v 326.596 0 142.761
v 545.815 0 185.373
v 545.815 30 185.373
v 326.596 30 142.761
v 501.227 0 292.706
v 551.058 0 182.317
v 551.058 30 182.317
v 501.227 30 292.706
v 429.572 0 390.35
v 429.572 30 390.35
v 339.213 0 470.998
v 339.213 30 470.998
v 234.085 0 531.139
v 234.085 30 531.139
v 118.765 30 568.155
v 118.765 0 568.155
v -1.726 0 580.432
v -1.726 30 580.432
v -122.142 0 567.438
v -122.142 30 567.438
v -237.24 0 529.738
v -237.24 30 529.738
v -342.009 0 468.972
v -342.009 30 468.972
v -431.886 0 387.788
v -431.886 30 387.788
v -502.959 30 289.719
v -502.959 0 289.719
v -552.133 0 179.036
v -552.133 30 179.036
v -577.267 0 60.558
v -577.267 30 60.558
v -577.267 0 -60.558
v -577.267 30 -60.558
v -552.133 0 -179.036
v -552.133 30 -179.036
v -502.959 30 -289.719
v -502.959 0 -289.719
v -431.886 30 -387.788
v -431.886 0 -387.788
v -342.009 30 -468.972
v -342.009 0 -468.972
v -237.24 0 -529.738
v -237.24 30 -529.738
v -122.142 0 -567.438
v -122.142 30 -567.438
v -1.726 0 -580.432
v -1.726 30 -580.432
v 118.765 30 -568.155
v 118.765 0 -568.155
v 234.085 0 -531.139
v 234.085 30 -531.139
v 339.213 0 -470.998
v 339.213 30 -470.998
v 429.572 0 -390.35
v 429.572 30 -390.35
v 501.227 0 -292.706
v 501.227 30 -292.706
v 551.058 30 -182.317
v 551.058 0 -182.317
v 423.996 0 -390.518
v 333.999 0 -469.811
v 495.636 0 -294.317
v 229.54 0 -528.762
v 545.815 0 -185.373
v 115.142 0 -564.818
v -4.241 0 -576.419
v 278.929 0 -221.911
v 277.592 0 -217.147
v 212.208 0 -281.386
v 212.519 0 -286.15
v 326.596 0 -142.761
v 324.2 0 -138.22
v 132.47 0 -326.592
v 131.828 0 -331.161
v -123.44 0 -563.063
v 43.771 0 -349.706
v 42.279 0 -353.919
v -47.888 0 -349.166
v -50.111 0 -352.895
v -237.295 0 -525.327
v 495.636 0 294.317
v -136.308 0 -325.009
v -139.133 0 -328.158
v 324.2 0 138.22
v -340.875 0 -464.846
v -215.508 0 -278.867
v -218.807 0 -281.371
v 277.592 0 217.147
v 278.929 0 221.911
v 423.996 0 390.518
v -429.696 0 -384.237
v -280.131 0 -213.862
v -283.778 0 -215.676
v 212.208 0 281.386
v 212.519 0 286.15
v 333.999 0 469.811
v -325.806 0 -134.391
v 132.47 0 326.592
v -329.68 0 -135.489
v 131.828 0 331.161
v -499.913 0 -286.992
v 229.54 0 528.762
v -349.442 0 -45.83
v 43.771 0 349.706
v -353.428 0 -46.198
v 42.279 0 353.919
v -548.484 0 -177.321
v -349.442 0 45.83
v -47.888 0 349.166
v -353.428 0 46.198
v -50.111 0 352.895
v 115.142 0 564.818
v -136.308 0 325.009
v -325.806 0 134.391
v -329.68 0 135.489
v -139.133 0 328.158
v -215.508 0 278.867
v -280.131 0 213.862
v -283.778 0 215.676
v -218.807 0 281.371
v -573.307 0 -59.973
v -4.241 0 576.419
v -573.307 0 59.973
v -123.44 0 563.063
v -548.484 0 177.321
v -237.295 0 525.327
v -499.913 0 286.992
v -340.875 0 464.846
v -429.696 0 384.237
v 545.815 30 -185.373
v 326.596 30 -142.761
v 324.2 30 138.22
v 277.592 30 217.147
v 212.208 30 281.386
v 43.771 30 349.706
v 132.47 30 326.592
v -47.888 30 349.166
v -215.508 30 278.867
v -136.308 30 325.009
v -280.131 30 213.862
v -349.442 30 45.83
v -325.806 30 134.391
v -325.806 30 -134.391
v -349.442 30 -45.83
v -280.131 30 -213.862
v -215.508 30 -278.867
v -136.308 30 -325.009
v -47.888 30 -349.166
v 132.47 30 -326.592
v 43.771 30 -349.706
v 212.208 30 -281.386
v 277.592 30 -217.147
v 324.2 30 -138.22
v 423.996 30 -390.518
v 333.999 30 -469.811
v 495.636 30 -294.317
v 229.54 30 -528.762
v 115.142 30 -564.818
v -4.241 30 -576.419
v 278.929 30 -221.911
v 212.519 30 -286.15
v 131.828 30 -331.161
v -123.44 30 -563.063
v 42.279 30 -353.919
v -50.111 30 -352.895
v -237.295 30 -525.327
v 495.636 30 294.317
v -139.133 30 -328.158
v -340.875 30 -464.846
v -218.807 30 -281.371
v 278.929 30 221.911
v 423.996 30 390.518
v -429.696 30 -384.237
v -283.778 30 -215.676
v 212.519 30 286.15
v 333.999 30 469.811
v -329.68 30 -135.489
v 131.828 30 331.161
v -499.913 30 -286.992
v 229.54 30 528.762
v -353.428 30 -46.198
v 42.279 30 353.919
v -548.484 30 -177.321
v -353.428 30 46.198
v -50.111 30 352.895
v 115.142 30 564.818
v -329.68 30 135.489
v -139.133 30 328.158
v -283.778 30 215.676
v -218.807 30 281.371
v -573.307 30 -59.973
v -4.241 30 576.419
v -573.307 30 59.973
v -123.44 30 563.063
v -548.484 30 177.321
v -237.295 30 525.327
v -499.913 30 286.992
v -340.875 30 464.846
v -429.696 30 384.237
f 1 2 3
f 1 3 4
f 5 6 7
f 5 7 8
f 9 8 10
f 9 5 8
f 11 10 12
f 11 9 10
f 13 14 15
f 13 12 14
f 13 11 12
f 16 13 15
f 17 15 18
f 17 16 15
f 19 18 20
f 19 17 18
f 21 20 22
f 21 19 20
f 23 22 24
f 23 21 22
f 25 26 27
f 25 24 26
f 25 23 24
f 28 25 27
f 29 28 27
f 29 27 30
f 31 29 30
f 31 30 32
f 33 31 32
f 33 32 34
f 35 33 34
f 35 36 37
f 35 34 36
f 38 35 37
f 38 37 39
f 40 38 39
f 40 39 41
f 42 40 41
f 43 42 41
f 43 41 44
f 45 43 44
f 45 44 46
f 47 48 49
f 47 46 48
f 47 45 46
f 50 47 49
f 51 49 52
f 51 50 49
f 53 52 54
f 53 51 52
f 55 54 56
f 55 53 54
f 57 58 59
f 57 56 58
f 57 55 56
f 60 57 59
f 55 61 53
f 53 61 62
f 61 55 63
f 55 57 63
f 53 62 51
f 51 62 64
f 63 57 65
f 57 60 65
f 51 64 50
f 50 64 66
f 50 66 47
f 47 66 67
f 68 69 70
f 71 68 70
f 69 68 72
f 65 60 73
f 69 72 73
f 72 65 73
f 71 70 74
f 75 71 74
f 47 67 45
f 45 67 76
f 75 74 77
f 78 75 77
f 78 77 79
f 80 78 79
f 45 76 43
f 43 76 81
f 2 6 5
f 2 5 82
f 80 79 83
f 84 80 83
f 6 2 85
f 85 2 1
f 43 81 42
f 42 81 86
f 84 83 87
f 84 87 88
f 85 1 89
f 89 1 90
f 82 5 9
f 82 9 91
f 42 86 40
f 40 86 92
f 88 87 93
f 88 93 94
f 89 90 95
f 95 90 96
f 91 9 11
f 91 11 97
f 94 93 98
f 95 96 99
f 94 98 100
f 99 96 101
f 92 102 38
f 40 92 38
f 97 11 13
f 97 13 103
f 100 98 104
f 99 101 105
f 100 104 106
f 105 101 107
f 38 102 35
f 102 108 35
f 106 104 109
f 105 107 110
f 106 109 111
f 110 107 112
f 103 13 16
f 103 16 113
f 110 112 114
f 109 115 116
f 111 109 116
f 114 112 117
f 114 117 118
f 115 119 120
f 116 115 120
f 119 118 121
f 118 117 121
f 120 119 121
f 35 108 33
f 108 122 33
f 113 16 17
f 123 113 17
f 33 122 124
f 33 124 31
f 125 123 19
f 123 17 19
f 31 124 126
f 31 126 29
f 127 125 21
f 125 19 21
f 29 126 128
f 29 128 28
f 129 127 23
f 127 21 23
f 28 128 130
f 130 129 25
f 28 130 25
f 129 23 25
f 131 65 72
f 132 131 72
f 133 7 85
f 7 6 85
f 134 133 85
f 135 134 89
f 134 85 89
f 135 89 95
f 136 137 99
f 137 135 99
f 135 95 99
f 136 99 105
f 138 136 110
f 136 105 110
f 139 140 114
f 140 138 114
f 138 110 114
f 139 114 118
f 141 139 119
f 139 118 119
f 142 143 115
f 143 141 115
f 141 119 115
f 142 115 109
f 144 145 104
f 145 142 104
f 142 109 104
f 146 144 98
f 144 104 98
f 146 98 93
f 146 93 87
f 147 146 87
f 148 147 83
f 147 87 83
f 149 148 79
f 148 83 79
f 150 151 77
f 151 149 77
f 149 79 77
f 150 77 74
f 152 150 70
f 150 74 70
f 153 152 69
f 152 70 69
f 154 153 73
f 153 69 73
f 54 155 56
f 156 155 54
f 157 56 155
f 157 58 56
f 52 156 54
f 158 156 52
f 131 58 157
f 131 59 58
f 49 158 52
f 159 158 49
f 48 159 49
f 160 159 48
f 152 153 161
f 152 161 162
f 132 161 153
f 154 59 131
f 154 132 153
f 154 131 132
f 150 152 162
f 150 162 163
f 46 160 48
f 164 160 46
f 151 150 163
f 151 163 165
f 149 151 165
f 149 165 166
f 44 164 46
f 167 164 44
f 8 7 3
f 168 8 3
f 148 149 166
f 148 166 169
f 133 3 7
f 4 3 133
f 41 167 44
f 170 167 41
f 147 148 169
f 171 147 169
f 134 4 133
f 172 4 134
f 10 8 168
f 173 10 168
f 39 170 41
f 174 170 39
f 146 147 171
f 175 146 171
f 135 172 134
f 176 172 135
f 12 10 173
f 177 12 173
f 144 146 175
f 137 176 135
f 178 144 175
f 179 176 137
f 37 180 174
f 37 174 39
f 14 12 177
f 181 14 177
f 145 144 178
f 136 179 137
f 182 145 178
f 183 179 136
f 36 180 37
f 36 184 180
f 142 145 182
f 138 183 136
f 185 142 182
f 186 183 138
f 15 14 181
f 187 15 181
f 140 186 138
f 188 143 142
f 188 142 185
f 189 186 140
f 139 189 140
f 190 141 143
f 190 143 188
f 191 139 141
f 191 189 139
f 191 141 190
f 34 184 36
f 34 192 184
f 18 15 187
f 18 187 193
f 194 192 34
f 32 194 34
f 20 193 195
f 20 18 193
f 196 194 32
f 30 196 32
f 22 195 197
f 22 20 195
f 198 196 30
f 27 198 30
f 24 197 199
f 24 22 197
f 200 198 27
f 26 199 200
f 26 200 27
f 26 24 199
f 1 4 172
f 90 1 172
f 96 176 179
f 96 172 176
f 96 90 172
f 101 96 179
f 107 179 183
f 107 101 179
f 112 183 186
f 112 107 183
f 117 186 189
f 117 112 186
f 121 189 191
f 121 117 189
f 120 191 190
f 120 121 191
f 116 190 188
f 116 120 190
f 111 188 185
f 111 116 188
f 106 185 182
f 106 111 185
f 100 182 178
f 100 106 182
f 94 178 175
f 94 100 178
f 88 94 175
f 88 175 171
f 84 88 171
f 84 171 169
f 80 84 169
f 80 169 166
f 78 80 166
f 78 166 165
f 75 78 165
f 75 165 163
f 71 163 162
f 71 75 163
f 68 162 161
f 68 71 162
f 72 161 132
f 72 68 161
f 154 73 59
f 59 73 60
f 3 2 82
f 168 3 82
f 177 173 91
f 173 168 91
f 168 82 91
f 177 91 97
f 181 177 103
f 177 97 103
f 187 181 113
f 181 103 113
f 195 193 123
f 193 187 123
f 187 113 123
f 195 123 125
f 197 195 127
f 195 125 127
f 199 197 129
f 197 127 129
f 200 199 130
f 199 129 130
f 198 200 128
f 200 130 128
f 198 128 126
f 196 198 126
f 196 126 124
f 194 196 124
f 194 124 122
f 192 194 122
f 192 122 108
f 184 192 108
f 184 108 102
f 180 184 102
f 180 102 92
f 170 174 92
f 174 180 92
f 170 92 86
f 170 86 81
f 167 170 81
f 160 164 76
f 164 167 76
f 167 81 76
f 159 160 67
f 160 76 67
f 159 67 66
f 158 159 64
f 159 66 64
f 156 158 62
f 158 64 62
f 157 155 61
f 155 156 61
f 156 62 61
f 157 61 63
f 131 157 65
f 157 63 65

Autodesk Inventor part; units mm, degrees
ref_plane "YZ Plane" through (0, 0, 0) normal (1, 0, 0) x (0, 1, 0)
ref_plane "XZ Plane" through (0, 0, 0) normal (0, 1, 0) x (-1, 0, 0)
ref_plane "XY Plane" through (0, 0, 0) normal (0, 0, 1) x (1, 0, 0)
sketch "Sketch1" plane through (0, 0, 0) normal (0, 1, 0) x (-1, 0, 0)
  line L0 (-545.8153, 185.3726) -> (-326.5965, 142.7608)
  line L1 (-545.8153, -185.3726) -> (-326.5965, -142.7608)
  arc A0 (-545.8153, -185.3726) -> (-545.8153, 185.3726) centre (0, 0) ccw
  arc A1 (-326.5965, -142.7608) -> (-326.5965, 142.7608) centre (0, 0) ccw
  arc A2 (-324.2, -138.2201) -> (-324.2, 138.2201) centre (0, 0) ccw
  arc A3 (-551.0584, -182.3169) -> (-551.0584, 182.3169) centre (0, 0) ccw
  line L2 (-551.0584, 182.3169) -> (-324.2, 138.2201)
  line L3 (-324.2, -138.2201) -> (-551.0584, -182.3169)
  dimension "d81" = 4
  dimension "d82" = 4
extrude "Extrusion2" add sketch "Sketch1" along normal blind 30
properties part number "Level 2 Edge Banding"
